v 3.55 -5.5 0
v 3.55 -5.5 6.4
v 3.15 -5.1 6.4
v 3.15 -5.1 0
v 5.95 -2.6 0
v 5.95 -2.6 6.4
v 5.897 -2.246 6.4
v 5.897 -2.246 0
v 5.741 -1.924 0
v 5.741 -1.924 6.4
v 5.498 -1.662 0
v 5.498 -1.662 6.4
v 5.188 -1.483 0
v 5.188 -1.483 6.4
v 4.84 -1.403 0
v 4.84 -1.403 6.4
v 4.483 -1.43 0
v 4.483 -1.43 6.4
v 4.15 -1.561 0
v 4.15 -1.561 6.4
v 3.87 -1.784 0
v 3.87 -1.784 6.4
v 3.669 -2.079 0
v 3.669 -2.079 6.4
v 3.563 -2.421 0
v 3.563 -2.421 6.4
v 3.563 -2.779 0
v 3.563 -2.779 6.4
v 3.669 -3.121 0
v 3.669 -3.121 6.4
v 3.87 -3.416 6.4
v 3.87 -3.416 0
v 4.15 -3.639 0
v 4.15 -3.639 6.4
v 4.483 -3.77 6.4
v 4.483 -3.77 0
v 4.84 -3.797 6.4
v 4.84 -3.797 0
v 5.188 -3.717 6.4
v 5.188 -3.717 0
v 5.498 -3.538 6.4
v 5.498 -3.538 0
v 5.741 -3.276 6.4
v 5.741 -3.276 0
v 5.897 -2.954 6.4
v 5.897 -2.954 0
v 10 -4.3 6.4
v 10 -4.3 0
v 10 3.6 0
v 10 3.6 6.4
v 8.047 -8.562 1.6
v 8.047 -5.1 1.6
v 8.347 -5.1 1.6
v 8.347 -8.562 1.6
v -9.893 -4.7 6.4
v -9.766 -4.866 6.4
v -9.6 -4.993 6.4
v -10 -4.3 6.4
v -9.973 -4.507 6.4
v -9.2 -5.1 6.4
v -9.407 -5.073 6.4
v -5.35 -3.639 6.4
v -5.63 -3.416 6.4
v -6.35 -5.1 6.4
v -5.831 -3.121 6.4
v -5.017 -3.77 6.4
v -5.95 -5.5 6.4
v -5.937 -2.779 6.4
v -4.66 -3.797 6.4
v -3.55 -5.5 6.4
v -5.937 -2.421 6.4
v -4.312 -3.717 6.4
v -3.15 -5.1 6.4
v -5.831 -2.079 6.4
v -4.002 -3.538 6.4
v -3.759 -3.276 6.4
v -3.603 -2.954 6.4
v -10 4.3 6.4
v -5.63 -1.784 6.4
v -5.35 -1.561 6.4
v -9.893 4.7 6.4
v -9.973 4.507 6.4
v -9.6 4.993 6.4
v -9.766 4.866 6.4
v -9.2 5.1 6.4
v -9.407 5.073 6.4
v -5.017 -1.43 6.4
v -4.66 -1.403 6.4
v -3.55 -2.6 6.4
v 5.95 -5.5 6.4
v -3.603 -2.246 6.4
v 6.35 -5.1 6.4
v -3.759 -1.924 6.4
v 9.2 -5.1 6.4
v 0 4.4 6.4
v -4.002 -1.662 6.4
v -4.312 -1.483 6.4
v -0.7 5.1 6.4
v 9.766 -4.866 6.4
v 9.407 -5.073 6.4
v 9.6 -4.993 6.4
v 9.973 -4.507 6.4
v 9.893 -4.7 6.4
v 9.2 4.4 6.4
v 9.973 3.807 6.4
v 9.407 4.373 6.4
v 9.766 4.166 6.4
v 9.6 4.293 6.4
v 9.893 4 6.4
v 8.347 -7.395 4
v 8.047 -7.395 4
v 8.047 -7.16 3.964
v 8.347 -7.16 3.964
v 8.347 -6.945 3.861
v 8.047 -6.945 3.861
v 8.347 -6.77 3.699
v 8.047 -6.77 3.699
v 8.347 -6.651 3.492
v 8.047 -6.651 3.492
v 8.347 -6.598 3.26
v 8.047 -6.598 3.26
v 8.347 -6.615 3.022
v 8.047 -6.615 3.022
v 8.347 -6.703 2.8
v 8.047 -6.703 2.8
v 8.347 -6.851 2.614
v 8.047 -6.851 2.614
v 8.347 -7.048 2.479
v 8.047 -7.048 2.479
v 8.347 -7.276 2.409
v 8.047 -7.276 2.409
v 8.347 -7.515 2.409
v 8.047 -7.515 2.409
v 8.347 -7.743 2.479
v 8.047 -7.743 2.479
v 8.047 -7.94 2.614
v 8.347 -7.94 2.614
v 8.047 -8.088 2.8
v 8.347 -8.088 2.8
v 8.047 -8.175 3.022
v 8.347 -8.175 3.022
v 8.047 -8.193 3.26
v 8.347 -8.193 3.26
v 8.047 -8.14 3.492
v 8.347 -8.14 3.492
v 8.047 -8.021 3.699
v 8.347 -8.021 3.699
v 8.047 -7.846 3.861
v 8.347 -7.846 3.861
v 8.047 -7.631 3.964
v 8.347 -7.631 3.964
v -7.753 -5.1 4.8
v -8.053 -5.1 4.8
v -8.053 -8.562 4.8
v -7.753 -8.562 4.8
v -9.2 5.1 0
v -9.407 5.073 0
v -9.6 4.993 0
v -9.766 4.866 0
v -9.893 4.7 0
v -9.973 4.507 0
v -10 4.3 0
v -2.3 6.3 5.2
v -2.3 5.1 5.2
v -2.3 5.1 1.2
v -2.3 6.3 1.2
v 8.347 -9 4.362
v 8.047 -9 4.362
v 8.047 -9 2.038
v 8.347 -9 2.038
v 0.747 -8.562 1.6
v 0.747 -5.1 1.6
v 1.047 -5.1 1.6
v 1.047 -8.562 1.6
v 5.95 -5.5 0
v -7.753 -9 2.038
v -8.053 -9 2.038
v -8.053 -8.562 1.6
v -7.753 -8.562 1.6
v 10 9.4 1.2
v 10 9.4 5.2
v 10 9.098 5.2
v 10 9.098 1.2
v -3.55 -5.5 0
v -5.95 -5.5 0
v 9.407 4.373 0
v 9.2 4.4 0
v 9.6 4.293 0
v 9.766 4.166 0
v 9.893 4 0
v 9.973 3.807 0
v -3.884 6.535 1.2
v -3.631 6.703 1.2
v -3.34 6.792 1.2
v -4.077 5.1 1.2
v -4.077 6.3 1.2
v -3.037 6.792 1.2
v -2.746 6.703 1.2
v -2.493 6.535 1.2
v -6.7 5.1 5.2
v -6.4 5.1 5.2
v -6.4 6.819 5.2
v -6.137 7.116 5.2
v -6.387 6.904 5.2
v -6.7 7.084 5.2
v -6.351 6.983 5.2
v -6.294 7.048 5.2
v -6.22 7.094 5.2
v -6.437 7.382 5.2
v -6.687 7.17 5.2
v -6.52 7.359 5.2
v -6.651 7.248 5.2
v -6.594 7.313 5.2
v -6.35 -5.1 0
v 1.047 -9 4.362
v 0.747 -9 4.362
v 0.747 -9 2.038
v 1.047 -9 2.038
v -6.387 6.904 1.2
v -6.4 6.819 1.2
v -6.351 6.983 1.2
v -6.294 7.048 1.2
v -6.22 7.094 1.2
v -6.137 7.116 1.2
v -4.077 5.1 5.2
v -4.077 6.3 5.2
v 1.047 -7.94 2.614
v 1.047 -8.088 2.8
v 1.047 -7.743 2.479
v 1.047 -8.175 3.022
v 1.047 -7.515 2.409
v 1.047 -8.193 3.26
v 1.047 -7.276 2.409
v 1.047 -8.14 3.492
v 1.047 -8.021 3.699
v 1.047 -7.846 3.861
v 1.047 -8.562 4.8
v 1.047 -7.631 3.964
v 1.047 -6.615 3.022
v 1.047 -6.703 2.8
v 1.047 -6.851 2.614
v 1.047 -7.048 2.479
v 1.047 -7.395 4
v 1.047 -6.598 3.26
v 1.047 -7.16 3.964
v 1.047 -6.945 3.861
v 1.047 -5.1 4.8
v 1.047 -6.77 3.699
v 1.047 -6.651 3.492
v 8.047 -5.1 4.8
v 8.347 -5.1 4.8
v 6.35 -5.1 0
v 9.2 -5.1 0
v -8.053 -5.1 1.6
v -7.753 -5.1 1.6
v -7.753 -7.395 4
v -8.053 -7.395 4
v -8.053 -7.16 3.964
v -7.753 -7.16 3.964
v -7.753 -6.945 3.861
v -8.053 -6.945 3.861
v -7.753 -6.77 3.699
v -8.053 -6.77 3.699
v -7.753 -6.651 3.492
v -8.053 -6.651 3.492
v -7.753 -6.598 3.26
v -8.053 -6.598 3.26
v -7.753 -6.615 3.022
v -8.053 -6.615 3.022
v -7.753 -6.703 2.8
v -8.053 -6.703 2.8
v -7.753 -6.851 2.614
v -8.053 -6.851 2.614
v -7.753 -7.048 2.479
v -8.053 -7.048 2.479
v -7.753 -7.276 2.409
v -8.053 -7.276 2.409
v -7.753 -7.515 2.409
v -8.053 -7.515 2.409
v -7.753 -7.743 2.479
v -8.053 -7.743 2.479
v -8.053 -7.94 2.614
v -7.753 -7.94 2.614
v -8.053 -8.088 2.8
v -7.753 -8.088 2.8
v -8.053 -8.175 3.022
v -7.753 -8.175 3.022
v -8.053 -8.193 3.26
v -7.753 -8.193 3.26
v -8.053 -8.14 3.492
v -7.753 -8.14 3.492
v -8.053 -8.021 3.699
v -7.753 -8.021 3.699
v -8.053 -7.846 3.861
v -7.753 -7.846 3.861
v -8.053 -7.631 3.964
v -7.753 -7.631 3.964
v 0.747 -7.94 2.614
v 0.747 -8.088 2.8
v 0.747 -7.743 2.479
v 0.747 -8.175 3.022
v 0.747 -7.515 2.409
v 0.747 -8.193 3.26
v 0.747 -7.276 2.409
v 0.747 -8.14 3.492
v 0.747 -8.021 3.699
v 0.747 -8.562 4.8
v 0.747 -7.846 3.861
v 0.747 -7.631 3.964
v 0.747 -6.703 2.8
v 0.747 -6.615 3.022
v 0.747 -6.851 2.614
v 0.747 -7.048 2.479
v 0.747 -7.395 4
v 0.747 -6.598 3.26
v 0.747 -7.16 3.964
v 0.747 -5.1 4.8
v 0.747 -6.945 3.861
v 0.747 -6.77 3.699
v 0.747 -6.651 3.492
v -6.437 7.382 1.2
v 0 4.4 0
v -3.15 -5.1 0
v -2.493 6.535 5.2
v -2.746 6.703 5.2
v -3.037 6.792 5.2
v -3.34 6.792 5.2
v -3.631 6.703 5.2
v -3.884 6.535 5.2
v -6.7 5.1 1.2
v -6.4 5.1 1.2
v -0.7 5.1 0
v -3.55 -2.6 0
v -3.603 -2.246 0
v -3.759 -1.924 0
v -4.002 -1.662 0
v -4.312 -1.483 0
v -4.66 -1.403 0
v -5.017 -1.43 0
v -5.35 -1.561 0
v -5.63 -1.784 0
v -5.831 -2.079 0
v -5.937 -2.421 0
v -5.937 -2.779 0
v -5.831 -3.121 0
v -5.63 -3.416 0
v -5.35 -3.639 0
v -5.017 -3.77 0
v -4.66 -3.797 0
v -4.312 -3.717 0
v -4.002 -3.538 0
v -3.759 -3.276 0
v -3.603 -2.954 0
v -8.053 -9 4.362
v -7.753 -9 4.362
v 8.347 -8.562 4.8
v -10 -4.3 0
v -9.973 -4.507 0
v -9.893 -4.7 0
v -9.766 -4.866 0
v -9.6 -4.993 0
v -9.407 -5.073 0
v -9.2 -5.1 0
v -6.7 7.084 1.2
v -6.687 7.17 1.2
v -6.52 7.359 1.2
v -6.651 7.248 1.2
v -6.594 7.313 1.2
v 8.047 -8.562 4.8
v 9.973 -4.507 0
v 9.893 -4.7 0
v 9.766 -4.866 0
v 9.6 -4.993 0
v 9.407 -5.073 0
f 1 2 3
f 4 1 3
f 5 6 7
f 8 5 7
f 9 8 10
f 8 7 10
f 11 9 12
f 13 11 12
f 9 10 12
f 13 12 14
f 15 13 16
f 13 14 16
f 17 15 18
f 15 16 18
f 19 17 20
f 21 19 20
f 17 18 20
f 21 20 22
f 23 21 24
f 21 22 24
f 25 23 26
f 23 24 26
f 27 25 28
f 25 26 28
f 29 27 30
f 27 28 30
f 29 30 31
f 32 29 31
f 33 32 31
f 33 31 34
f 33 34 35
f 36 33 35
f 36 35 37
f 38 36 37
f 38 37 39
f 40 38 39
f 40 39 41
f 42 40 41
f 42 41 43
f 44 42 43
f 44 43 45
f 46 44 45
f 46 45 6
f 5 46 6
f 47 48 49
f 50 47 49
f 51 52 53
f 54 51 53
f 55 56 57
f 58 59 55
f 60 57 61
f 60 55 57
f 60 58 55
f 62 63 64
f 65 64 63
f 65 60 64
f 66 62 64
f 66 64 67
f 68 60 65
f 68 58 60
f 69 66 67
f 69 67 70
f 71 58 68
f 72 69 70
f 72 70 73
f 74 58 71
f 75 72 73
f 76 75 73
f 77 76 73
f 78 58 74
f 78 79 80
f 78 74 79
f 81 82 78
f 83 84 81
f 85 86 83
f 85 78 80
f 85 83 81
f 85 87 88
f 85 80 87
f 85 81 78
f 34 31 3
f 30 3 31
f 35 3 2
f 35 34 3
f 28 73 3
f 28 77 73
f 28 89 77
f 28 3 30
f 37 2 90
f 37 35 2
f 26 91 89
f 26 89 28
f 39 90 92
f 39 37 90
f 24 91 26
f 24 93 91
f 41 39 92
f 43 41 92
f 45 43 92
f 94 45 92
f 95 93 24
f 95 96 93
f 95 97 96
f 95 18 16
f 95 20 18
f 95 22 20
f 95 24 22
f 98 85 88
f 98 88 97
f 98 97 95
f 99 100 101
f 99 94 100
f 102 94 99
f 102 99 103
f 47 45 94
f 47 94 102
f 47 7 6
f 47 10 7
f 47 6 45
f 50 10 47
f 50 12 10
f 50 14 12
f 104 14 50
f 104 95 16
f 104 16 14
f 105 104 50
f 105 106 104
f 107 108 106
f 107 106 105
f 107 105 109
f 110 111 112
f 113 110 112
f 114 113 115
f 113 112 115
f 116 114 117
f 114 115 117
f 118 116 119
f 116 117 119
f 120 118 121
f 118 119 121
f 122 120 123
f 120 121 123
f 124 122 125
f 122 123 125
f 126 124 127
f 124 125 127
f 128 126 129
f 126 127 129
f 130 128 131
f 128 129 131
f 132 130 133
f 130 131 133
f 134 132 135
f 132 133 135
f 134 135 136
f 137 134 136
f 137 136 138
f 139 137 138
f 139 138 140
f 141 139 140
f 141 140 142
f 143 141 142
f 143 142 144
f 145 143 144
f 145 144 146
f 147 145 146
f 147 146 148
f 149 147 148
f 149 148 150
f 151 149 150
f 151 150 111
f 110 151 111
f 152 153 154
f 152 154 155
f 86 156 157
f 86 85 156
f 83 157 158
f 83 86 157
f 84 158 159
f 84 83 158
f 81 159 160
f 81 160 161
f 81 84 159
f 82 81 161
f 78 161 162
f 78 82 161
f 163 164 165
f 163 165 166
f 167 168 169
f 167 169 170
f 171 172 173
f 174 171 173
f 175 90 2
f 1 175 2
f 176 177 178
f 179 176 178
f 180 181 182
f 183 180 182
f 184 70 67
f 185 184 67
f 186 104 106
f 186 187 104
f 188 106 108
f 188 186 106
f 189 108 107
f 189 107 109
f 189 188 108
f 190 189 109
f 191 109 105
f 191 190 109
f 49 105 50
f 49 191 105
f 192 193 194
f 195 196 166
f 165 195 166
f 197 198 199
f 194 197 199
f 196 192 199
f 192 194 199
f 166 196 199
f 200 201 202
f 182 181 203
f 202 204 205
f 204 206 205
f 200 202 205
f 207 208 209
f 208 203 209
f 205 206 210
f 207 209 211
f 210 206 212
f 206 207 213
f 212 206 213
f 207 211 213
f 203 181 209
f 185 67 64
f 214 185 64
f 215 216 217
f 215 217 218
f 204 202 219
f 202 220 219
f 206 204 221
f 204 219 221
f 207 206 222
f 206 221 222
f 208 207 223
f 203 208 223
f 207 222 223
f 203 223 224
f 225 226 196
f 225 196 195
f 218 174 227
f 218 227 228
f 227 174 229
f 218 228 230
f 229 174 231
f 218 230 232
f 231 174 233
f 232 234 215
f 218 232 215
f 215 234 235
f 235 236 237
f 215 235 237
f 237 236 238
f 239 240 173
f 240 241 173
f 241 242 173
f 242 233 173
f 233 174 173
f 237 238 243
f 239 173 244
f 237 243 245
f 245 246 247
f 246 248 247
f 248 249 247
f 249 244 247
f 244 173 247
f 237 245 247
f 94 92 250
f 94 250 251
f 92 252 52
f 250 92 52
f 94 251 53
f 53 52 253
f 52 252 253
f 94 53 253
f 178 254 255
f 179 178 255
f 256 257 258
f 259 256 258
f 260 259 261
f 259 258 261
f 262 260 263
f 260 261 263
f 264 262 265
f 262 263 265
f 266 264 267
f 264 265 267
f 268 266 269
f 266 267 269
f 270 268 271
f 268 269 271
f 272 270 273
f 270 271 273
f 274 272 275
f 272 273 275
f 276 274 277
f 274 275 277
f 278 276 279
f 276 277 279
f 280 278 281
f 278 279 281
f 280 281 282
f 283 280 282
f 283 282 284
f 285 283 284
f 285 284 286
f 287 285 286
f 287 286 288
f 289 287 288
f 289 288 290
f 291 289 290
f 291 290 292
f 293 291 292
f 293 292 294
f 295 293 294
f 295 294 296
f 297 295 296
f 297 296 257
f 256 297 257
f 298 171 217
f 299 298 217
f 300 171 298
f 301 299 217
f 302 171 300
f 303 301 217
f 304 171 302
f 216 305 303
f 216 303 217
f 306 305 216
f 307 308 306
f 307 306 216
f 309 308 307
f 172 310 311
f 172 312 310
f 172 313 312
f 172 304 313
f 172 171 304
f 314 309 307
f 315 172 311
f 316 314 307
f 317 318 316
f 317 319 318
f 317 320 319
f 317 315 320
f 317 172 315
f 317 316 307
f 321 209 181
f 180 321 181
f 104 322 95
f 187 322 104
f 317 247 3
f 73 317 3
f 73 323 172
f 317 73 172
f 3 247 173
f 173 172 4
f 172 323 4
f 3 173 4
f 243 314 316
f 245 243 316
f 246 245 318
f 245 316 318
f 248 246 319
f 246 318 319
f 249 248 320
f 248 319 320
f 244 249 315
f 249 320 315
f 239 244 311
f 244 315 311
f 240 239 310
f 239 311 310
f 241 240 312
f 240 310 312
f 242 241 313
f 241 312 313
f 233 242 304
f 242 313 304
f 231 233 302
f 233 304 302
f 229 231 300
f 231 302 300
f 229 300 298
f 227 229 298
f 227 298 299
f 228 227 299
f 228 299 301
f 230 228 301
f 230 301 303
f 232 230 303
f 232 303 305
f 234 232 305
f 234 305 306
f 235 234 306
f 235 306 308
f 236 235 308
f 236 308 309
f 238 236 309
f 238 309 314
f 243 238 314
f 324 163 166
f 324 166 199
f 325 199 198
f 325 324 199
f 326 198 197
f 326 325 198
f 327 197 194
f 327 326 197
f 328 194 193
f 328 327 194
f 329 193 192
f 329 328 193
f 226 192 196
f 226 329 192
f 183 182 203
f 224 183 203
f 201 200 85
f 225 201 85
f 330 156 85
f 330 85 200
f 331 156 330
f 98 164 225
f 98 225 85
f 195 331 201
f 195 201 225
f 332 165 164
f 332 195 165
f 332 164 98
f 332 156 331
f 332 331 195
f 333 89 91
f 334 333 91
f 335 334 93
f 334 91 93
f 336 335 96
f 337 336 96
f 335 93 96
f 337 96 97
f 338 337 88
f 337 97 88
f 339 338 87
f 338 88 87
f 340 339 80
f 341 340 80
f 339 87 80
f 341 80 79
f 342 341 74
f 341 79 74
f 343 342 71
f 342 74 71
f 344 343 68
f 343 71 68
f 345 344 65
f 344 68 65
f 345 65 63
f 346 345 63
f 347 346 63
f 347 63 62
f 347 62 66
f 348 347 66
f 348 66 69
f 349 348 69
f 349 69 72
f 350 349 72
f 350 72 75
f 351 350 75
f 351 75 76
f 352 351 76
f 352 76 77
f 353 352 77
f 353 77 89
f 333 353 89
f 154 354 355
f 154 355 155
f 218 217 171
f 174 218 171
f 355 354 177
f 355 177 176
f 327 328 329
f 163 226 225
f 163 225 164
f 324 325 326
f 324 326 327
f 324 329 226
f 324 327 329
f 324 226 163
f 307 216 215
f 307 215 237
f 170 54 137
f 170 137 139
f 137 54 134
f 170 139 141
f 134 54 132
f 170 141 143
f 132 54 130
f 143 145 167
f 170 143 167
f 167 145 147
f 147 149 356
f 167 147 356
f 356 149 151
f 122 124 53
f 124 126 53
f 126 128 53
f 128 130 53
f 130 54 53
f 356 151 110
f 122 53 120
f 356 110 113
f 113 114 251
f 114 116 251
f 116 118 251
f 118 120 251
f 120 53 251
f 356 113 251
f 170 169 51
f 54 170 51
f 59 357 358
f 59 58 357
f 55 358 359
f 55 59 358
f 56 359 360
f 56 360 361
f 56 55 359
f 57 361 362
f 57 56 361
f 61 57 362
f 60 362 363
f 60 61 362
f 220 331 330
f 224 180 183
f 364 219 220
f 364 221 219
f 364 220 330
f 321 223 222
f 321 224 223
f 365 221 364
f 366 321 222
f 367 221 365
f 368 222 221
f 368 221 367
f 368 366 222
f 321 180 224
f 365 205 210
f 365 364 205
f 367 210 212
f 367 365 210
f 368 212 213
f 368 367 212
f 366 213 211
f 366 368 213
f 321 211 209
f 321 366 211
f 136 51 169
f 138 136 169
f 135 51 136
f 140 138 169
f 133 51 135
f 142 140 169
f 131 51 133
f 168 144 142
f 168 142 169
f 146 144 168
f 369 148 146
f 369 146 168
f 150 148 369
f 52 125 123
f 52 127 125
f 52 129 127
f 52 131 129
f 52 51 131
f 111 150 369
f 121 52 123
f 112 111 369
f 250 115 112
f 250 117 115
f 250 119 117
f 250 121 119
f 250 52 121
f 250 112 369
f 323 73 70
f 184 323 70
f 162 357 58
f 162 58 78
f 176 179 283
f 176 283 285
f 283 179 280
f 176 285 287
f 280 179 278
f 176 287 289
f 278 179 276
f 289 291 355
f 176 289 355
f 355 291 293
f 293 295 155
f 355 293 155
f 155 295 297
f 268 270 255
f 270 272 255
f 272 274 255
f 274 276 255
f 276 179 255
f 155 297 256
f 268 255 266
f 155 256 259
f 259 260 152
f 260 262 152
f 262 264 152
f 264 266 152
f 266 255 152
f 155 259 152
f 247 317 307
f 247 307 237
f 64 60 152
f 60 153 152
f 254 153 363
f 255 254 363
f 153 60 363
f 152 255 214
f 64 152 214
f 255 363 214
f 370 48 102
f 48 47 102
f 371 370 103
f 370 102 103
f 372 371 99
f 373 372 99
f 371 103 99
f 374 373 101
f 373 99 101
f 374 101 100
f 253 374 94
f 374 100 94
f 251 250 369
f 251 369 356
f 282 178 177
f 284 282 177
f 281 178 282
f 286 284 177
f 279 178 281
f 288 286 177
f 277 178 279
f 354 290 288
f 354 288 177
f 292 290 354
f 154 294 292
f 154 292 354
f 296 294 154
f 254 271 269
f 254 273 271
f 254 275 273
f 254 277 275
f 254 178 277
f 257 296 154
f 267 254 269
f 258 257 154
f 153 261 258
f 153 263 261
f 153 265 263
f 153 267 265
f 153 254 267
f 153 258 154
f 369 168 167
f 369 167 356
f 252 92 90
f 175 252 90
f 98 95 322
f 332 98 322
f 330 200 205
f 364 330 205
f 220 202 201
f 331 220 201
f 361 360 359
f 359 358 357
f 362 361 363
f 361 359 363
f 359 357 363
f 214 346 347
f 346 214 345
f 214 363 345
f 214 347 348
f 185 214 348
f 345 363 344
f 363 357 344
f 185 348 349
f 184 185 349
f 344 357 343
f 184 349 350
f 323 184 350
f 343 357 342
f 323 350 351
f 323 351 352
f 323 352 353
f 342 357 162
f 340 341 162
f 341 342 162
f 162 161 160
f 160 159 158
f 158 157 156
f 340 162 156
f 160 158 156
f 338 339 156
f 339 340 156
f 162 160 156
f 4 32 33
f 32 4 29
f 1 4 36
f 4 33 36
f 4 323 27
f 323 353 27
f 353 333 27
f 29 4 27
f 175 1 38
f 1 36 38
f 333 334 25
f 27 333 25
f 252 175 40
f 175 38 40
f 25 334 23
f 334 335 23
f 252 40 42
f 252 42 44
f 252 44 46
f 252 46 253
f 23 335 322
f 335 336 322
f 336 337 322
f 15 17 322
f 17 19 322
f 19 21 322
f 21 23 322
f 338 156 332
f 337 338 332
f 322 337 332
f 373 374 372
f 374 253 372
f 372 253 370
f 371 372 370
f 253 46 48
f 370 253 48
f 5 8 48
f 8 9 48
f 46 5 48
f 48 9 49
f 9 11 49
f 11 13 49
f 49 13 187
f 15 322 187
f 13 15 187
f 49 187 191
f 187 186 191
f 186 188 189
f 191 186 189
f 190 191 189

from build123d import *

# Parameters (mm, degrees)
SKETCH1_W           = 20
SKETCH1_H           = 10.2
BOSS_EXTRUDE1_DEPTH = 6.4
SKETCH2_W           = 0.3
SKETCH2_H           = 3.2
BOSS_EXTRUDE2_DEPTH = 3.9
CUT_EXTRUDE1_REACH  = 23.163
SKETCH3_R           = 0.8
LPATTERN1_COUNT     = 2
LPATTERN1_PITCH     = 8.8
LPATTERN2_COUNT     = 2
LPATTERN2_PITCH     = 16.1
SKETCH4_W           = 10
SKETCH4_H           = 6.4
CUT_EXTRUDE2_DEPTH  = 0.7
SKETCH5_R           = 1.2
CUT_EXTRUDE3_DEPTH  = 15.898322053
BOSS_EXTRUDE3_DEPTH = 6.4
CHAMFER1_SIZE       = 0.7
FILLET1_R           = 0.8
BOSS_EXTRUDE4_START = -1.2
BOSS_EXTRUDE4_DEPTH = 4
BOSS_EXTRUDE5_DEPTH = 4
FILLET2_R           = 0.3


with BuildPart() as part:
    # Sketch1 → Boss-Extrude1 (new body)
    with BuildSketch(Plane.XY):
        Rectangle(SKETCH1_W, SKETCH1_H)
    extrude(amount=BOSS_EXTRUDE1_DEPTH)

    # Sketch2 → Boss-Extrude2 (add)
    with BuildSketch(Plane.XZ.offset(5.1)):
        with Locations((-7.902688508, 3.2)):
            Rectangle(SKETCH2_W, SKETCH2_H)
    boss_extrude2 = extrude(amount=BOSS_EXTRUDE2_DEPTH)

    # Sketch3 → Cut-Extrude1 (cut, up to next)
    with BuildSketch(Plane.ZY.offset(8.052688508), mode=Mode.PRIVATE) as cut_extrude1_sk1:
        with Locations((3.2, -7.395440134)):
            Circle(SKETCH3_R)
    cut_extrude1_tool1 = extrude(cut_extrude1_sk1.sketch, amount=-CUT_EXTRUDE1_REACH, mode=Mode.PRIVATE) & part.part
    # Sketch3 → Cut-Extrude1 (cut, up to next)
    with BuildSketch(Plane.ZY.offset(8.052688508), mode=Mode.PRIVATE) as cut_extrude1_sk2:
        Polygon((4.362215953, -9), (4.8, -8.562215953), (4.8, -9), align=None)
    cut_extrude1_tool2 = extrude(cut_extrude1_sk2.sketch, amount=-CUT_EXTRUDE1_REACH, mode=Mode.PRIVATE) & part.part
    # Sketch3 → Cut-Extrude1 (cut, up to next)
    with BuildSketch(Plane.ZY.offset(8.052688508), mode=Mode.PRIVATE) as cut_extrude1_sk3:
        Polygon((2.037784047, -9), (1.6, -8.562215953), (1.6, -9), align=None)
    cut_extrude1_tool3 = extrude(cut_extrude1_sk3.sketch, amount=-CUT_EXTRUDE1_REACH, mode=Mode.PRIVATE) & part.part
    cut_extrude1_1 = cut_extrude1_tool1.solids().sort_by_distance((-8.052689, -7.39544, 3.2))[0]
    add(cut_extrude1_1, mode=Mode.SUBTRACT)
    cut_extrude1_2 = cut_extrude1_tool2.solids().sort_by_distance((-8.052689, -8.854072, 4.654072))[0]
    add(cut_extrude1_2, mode=Mode.SUBTRACT)
    cut_extrude1_3 = cut_extrude1_tool3.solids().sort_by_distance((-8.052689, -8.854072, 1.745928))[0]
    add(cut_extrude1_3, mode=Mode.SUBTRACT)
    cut_extrude1 = cut_extrude1_1 + cut_extrude1_2 + cut_extrude1_3  # Cut-Extrude1 as one shape, for the pattern or mirror that repeats it

    # LPattern1: Boss-Extrude2, Cut-Extrude1 ×2
    with Locations(*[(i * LPATTERN1_PITCH, 0, 0) for i in range(1, LPATTERN1_COUNT)]):
        add(boss_extrude2)
        add(cut_extrude1, mode=Mode.SUBTRACT)

    # LPattern2: Boss-Extrude2, Cut-Extrude1 ×2
    with Locations(*[(i * LPATTERN2_PITCH, 0, 0) for i in range(1, LPATTERN2_COUNT)]):
        add(boss_extrude2)
        add(cut_extrude1, mode=Mode.SUBTRACT)

    # Sketch4 → Cut-Extrude2 (cut)
    with BuildSketch(Plane(origin=(0, 5.1, 0), x_dir=(1, 0, 0), z_dir=(0, 1, 0))):
        with Locations((5, -3.2)):
            Rectangle(SKETCH4_W, SKETCH4_H)
    extrude(amount=-CUT_EXTRUDE2_DEPTH, mode=Mode.SUBTRACT)

    # Sketch5 → Cut-Extrude3 (cut, through all)
    with BuildSketch(Plane.XY.offset(6.4)):
        with Locations((-4.75, -2.6)):
            Circle(SKETCH5_R)
        with Locations((4.75, -2.6)):
            Circle(SKETCH5_R)
    extrude(amount=-CUT_EXTRUDE3_DEPTH, mode=Mode.SUBTRACT)

    # Sketch7 → Boss-Extrude3 (add)
    with BuildSketch(Plane.XY.offset(6.4)):
        Polygon((-3.55, -5.5), (-5.95, -5.5), (-6.35, -5.1), (-3.15, -5.1), align=None)
        Polygon((5.95, -5.5), (3.55, -5.5), (3.15, -5.1), (6.35, -5.1), align=None)
    extrude(amount=-BOSS_EXTRUDE3_DEPTH)

    # Chamfer1
    chamfer1_edges = [part.edges().sort_by_distance(p)[0] for p in [
        (0, 5.1, 3.2),
    ]]
    chamfer(chamfer1_edges, length=CHAMFER1_SIZE - 0.0001)  # a hair under: the kernel refuses the full size

    # Fillet1
    fillet1_edges = [part.edges().sort_by_distance(p)[0] for p in [
        (10, 4.4, 3.2),
        (10, -5.1, 3.2),
        (-10, -5.1, 3.2),
        (-10, 5.1, 3.2),
    ]]
    fillet(fillet1_edges, radius=FILLET1_R)

    # Sketch8 → Boss-Extrude4 (add)
    with BuildSketch(Plane.XY.offset(6.4).offset(BOSS_EXTRUDE4_START)):
        with BuildLine():
            Line((-2.300370524, 5.1), (-2.300370524, 6.3))
            ThreePointArc((-2.300370524, 6.3), (-3.188470104, 6.802852397), (-4.076569683, 6.3))
            Line((-4.076569683, 6.3), (-4.076569683, 5.1))
            Line((-4.076569683, 5.1), (-2.300370524, 5.1))
        make_face()
    extrude(amount=-BOSS_EXTRUDE4_DEPTH)

    # Sketch11 → Boss-Extrude5 (add)
    with BuildSketch(Plane.XY.offset(5.2)):
        Polygon((-6.4, 5.1), (-6.7, 5.1), (-6.7, 7.349497833), (10, 9.4), (10, 9.097747052), (-6.4, 7.084080254), align=None)
    extrude(amount=-BOSS_EXTRUDE5_DEPTH)

    # Fillet2
    fillet2_edges = [part.edges().sort_by_distance(p)[0] for p in [
        (-6.7, 7.349497833, 3.2),
        (-6.4, 7.084080254, 3.2),
    ]]
    fillet(fillet2_edges, radius=FILLET2_R)


solid = part.part
